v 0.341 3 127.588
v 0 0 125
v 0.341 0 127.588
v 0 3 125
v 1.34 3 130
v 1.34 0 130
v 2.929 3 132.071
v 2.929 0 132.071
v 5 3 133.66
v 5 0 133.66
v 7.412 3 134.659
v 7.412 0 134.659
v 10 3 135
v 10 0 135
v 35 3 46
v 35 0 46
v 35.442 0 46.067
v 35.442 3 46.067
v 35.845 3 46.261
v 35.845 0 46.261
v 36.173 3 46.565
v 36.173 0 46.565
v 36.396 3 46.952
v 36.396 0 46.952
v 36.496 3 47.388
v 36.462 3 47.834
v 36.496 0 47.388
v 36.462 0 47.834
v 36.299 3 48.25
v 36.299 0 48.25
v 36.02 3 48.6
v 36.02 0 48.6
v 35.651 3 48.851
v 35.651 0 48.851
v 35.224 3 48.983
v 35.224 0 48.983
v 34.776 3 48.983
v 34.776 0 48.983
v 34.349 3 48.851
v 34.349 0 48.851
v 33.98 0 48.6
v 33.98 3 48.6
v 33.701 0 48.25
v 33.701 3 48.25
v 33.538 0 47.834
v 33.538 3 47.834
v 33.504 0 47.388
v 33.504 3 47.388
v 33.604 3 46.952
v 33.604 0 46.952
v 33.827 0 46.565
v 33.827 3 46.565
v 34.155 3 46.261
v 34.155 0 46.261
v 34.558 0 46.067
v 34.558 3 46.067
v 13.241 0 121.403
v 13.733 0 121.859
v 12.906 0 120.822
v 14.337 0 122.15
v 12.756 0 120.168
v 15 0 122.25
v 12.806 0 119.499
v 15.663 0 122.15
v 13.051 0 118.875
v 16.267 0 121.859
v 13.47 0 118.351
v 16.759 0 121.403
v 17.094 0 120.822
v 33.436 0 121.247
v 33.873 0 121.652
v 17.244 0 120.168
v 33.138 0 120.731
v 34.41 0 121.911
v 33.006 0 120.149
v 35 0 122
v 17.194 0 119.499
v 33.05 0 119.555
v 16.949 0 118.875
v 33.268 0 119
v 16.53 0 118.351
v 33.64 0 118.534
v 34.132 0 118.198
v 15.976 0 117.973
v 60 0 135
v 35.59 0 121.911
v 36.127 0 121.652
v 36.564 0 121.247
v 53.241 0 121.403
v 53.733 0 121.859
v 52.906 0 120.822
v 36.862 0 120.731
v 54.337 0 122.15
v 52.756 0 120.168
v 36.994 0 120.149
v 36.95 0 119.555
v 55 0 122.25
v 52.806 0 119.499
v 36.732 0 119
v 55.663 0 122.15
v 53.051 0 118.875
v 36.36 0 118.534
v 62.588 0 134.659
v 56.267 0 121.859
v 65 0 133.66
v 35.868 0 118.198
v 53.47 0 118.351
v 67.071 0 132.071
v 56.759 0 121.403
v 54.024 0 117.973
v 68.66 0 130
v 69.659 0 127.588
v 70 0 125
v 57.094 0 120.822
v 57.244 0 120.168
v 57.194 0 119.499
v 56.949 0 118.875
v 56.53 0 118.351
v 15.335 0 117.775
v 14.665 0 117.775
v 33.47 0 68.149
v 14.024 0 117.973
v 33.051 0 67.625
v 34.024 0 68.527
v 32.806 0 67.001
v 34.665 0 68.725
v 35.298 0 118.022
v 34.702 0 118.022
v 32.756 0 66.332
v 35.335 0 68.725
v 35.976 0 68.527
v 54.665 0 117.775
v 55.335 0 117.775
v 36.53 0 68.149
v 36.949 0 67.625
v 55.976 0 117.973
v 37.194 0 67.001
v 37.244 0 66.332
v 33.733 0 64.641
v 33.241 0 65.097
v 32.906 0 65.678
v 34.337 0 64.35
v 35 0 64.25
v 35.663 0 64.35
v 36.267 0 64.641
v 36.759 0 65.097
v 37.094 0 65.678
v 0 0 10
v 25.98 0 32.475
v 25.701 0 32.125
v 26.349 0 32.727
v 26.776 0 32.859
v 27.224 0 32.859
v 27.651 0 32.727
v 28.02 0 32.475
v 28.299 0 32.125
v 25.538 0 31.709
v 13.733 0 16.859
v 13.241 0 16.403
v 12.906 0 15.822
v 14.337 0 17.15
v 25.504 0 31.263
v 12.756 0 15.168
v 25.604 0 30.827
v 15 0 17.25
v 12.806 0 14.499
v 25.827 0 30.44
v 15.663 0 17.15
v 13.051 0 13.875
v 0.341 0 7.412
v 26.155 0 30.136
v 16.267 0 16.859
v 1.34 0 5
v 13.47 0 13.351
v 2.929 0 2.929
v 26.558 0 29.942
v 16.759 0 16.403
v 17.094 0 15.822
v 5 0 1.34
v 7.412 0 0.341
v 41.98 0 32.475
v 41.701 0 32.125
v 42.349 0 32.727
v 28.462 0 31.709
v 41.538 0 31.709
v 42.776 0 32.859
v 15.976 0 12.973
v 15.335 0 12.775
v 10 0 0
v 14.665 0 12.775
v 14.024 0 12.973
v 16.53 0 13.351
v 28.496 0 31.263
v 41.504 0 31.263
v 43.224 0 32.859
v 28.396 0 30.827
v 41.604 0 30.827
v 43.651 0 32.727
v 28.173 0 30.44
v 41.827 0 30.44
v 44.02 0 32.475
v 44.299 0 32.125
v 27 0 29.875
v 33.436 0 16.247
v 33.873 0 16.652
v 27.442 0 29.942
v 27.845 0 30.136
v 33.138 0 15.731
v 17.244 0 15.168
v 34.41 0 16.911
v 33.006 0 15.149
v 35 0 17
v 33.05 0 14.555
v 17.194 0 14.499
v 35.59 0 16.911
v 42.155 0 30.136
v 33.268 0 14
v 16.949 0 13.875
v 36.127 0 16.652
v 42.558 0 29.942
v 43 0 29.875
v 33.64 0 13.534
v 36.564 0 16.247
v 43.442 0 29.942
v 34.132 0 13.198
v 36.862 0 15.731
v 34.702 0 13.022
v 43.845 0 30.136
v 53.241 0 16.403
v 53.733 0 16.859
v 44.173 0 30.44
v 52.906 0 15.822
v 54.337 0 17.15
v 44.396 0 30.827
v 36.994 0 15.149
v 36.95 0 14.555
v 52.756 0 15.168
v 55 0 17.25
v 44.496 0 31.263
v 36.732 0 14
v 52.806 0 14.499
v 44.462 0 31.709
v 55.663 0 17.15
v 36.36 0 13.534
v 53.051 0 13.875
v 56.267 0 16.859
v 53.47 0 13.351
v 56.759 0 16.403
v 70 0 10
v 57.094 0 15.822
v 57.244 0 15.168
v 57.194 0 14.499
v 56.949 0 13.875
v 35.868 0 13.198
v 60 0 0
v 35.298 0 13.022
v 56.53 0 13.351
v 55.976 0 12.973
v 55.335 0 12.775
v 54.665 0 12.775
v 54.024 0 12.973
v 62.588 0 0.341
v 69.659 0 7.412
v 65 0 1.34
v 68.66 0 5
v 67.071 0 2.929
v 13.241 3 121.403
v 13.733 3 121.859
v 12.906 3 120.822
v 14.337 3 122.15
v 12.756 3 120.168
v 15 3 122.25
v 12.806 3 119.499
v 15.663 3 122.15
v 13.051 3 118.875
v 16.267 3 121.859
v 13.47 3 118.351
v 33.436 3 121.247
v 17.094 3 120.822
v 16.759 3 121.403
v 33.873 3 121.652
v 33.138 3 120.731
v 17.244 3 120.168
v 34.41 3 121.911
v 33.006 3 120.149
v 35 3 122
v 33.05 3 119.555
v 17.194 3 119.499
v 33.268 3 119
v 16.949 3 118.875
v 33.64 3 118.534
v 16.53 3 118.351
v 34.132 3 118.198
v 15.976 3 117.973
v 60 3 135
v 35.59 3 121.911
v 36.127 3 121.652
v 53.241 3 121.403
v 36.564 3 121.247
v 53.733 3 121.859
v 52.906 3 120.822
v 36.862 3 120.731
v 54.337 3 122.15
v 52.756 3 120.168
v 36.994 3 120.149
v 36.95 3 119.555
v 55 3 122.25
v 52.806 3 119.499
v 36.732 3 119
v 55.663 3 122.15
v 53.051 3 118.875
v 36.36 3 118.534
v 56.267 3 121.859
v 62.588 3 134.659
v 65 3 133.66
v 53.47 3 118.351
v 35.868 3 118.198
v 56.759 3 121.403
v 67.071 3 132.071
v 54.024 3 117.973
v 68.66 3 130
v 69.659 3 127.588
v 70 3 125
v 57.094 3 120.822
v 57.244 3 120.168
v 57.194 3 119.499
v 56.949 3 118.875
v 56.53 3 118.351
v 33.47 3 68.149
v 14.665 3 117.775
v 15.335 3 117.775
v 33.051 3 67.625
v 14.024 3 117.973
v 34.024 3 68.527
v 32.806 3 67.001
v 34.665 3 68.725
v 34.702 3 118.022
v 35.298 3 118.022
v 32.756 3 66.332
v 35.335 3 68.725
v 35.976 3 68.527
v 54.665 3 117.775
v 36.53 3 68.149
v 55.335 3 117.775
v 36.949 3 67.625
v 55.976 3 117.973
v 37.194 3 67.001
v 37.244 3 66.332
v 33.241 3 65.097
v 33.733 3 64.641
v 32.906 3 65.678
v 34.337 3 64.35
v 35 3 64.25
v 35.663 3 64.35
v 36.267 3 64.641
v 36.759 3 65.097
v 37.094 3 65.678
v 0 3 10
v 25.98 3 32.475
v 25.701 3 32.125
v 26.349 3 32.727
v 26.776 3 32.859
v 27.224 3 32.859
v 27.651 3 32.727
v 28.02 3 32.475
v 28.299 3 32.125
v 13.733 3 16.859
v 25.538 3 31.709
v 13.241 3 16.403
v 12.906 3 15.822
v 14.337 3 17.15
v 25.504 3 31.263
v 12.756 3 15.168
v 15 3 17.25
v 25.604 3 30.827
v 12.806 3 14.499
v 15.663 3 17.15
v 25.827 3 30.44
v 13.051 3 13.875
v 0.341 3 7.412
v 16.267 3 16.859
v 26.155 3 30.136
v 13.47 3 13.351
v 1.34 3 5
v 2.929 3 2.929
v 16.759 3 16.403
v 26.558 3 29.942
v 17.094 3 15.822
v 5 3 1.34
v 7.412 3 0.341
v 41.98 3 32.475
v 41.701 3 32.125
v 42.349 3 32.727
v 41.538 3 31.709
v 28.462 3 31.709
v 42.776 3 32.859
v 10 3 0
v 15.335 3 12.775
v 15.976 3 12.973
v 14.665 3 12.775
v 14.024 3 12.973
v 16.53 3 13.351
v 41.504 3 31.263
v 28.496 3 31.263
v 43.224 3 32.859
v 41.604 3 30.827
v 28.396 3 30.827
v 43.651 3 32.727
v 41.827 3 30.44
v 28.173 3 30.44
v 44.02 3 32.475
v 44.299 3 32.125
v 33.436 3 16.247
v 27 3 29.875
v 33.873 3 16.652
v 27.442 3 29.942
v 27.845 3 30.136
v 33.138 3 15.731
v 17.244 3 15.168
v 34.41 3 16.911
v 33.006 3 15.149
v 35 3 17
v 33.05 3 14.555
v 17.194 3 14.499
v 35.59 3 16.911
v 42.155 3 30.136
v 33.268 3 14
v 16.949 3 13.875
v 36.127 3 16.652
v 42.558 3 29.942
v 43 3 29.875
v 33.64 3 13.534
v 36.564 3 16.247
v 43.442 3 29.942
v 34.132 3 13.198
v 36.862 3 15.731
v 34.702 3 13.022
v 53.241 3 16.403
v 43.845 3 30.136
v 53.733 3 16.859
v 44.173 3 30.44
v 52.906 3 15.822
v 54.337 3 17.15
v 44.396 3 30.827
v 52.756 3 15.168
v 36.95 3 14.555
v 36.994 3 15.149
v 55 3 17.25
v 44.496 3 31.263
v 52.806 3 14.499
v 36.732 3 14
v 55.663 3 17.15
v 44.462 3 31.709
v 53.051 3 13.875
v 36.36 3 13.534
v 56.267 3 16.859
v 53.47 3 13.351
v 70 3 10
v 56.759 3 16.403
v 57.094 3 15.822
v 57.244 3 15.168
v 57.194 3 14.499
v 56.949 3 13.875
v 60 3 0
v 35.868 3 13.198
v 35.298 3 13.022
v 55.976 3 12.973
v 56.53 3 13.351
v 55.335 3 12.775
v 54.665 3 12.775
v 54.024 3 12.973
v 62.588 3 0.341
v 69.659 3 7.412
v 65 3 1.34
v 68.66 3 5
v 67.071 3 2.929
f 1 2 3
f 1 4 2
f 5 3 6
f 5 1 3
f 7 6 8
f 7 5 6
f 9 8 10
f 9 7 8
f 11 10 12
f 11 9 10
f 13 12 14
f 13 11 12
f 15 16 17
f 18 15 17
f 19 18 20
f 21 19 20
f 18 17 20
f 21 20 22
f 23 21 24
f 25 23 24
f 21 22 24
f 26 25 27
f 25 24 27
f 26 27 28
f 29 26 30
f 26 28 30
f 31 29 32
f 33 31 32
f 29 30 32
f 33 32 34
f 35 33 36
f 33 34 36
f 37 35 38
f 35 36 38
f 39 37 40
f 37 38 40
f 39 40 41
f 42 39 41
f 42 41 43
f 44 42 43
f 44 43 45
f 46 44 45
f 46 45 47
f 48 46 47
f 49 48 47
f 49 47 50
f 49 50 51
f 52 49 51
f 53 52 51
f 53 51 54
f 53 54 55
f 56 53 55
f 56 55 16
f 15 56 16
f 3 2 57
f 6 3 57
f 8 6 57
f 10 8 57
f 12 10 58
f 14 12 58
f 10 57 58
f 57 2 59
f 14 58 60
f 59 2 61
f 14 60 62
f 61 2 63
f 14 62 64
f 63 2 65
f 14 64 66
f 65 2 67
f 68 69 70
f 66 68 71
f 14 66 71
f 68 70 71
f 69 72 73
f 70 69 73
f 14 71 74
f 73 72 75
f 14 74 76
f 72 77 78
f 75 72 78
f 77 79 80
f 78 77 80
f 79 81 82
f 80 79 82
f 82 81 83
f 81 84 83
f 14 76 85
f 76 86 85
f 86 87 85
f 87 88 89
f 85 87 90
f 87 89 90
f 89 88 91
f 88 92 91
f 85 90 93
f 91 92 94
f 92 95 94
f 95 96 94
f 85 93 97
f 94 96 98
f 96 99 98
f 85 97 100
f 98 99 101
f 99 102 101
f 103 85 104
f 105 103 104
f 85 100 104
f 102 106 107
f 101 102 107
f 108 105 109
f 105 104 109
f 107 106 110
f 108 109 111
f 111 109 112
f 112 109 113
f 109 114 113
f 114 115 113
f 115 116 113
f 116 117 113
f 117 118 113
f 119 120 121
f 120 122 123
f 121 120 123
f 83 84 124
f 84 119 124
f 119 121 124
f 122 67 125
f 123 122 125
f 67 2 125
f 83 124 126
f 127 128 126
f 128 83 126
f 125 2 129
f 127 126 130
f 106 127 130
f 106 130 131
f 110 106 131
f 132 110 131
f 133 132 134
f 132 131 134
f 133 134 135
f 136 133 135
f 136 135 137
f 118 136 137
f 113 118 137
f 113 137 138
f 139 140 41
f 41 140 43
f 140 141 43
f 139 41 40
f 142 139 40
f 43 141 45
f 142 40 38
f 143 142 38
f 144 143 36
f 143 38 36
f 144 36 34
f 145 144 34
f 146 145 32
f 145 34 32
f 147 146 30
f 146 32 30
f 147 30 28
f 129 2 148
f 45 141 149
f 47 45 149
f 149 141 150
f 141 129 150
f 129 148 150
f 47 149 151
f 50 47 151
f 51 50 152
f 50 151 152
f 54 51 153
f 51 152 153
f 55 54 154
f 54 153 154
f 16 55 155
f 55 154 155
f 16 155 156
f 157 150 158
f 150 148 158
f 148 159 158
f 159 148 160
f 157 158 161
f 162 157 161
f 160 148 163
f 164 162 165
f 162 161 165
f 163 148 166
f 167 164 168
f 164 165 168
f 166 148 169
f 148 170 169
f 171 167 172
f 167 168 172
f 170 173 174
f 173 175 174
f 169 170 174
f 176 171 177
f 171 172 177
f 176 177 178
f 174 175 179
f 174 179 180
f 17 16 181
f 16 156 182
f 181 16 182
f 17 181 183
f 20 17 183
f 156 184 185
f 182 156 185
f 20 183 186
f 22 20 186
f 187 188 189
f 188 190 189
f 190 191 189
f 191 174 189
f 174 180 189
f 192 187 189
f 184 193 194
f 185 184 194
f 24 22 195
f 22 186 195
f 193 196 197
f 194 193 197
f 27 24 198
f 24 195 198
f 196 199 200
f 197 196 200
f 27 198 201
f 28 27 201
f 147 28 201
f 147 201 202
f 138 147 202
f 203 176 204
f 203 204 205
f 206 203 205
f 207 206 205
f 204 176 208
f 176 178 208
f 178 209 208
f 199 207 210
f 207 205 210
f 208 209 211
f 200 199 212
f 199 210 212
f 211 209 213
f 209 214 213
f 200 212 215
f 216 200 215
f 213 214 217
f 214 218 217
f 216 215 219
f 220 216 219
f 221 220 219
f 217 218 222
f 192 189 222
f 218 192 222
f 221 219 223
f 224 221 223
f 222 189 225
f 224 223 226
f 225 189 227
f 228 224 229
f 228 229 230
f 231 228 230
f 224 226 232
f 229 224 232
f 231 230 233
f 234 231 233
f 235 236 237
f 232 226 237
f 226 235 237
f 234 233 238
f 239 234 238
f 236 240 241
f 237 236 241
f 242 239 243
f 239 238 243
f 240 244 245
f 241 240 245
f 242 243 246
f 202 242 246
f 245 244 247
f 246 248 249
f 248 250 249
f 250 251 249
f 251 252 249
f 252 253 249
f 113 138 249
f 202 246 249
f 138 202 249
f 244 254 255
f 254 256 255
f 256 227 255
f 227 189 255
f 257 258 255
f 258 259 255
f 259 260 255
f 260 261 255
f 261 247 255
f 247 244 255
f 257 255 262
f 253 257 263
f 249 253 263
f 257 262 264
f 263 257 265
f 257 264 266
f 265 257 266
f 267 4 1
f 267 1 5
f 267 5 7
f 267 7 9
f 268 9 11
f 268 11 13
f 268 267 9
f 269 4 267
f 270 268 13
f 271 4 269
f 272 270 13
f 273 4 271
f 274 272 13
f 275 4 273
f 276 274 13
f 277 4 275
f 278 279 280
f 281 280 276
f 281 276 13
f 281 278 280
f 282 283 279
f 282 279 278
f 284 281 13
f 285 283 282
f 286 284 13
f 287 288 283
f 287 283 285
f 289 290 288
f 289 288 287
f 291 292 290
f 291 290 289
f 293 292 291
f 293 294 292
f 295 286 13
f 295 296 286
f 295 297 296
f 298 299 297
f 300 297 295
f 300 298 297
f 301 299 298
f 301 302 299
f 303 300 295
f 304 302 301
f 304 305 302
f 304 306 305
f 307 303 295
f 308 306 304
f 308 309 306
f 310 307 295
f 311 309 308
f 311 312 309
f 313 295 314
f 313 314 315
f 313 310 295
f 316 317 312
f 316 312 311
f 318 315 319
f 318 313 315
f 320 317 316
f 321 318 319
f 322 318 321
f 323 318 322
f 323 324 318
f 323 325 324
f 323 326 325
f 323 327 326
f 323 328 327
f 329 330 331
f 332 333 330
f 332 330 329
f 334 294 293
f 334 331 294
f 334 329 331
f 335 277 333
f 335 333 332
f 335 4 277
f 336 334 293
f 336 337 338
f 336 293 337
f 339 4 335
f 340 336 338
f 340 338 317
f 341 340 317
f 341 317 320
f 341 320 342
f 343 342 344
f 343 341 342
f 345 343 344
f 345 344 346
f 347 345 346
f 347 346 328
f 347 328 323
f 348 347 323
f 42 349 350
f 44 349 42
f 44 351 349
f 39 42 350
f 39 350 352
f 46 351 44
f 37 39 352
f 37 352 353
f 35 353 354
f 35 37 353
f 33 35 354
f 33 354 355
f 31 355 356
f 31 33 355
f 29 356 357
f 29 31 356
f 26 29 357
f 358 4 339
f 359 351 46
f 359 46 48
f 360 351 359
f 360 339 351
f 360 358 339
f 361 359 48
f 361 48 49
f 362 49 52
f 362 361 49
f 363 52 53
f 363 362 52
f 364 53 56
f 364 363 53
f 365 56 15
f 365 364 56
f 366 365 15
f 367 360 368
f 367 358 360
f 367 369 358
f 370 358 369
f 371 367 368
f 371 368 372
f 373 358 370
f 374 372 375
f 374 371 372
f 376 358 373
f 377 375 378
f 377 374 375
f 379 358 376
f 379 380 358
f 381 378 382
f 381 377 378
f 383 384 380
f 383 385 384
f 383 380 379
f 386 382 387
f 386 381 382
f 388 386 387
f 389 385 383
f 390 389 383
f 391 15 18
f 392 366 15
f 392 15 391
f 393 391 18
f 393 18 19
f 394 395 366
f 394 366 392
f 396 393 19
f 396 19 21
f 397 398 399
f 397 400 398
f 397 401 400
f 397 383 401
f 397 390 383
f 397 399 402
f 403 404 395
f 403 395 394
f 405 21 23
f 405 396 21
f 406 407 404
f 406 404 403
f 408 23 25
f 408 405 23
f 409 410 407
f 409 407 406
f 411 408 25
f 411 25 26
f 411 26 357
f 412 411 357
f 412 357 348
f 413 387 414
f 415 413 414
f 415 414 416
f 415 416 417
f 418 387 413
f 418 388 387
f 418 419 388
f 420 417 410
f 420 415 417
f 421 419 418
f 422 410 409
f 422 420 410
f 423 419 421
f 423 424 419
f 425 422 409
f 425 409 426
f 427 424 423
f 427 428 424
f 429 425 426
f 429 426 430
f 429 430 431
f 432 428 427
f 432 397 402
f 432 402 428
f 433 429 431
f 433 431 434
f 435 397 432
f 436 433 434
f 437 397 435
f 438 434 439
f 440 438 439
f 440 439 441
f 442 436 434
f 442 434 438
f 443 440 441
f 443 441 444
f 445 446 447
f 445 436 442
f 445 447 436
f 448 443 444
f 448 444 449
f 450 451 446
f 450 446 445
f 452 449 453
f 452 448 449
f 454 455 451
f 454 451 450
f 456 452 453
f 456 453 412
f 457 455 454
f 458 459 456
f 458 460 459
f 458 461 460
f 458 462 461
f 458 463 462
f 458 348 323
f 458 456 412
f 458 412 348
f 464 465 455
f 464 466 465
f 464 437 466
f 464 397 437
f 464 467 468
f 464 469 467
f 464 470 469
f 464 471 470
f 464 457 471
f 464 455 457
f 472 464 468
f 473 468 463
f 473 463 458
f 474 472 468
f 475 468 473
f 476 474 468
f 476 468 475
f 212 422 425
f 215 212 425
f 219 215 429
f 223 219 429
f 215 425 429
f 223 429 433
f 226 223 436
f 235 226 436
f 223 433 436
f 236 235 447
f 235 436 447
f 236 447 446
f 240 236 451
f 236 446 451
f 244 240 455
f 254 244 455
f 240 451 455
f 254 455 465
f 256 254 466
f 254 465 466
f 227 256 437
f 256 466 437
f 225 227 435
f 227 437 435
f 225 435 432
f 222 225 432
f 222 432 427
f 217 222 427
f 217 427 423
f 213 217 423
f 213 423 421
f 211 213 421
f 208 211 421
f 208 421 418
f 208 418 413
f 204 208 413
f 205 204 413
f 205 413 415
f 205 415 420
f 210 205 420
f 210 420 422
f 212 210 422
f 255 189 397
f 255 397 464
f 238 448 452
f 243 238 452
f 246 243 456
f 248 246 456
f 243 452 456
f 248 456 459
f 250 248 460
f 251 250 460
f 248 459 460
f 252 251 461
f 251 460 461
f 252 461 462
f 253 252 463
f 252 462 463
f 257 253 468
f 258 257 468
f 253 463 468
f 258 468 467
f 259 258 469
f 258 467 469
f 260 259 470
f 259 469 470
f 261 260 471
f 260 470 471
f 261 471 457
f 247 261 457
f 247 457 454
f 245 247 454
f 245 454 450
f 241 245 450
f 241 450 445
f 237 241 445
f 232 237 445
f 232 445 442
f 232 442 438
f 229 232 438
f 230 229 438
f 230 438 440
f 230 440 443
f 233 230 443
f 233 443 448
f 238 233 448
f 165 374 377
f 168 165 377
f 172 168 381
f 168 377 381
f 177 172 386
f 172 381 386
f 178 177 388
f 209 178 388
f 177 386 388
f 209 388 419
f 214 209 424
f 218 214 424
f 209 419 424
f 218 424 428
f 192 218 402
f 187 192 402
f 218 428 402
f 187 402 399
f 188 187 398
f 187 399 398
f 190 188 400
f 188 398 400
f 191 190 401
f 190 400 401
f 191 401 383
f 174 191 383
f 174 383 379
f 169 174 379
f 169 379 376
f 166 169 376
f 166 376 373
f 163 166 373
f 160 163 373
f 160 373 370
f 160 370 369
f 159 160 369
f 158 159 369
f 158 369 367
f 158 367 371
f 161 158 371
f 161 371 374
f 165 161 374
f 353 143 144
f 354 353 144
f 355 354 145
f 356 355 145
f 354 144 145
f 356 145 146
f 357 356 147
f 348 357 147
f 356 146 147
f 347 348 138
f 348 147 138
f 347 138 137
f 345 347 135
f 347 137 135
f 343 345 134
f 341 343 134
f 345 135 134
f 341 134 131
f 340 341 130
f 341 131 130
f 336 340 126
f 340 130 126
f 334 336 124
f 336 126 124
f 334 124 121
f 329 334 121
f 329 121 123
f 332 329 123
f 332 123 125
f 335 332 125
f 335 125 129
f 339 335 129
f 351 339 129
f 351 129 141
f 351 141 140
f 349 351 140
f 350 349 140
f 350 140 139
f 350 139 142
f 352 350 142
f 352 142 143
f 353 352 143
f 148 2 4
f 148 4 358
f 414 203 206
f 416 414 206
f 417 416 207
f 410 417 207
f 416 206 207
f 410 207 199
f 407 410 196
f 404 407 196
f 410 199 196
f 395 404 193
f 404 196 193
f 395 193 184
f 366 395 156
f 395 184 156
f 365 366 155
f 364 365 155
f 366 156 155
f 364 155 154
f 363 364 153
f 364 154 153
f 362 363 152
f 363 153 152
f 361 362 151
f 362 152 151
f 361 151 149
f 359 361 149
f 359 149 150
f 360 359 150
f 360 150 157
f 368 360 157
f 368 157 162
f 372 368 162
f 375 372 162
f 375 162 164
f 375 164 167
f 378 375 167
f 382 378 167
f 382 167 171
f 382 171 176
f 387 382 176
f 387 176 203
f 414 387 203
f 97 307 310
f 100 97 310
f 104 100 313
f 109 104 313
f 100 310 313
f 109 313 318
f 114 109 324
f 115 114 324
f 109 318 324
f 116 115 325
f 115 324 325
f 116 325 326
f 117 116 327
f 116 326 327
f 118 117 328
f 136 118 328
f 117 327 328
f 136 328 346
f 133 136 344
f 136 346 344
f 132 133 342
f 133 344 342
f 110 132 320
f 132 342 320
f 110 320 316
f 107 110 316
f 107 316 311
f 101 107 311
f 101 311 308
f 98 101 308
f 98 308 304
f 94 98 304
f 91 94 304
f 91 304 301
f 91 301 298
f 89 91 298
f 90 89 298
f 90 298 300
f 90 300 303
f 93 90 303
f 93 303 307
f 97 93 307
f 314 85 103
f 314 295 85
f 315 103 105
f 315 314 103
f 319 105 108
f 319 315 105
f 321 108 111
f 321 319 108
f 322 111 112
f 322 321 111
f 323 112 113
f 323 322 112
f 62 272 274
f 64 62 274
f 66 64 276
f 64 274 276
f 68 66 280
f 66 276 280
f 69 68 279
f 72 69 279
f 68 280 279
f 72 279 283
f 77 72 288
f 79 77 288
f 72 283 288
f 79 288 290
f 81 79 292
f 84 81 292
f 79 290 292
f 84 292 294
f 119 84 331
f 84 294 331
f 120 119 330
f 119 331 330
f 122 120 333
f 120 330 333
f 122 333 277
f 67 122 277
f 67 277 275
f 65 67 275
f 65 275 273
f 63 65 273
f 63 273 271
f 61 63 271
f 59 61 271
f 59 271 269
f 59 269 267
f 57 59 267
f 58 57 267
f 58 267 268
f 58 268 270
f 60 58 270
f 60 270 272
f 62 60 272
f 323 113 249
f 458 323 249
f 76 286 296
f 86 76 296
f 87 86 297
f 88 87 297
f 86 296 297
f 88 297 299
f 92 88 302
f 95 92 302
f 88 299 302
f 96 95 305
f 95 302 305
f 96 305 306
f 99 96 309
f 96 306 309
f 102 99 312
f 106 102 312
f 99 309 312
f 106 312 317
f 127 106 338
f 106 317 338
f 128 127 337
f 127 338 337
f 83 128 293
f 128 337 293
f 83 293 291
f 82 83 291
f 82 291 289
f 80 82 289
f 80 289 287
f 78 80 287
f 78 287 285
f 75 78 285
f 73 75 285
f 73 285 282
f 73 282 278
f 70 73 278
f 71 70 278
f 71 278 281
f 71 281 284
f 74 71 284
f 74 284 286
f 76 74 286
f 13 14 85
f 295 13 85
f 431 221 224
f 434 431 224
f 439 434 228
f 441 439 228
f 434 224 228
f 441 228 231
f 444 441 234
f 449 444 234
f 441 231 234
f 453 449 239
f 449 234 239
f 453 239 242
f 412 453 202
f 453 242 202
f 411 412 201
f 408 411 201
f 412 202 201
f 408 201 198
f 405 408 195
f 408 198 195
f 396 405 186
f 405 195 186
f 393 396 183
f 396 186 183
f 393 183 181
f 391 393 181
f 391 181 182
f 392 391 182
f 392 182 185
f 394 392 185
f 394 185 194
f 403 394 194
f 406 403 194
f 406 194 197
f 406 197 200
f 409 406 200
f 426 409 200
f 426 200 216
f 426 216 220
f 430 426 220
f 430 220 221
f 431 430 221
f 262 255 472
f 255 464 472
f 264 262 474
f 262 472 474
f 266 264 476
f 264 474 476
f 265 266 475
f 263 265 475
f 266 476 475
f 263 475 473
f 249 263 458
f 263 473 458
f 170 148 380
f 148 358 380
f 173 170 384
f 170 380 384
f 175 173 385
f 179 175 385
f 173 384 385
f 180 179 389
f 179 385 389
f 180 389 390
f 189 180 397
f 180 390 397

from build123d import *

# Parameters (mm, degrees)
SKETCH_1_W          = 70
SKETCH_1_H          = 135
EXTRUDE_1_DEPTH     = 3
SKETCH_2_R          = 2.25
SKETCH_2_R_2        = 2
CUT_EXTRUDE_1_DEPTH = 153.098652197
FILLET_1_R          = 10
SKETCH_3_R          = 1.5
SKETCH_3_R_2        = 2.25
CUT_EXTRUDE_2_DEPTH = 153.098652197


with BuildPart() as part:
    # 草图1 → 凸台-拉伸1 (new body)
    with BuildSketch(Plane(origin=(0, 0, 0), x_dir=(1, 0, 0), z_dir=(0, 1, 0))):
        with Locations((35, -67.5)):
            Rectangle(SKETCH_1_W, SKETCH_1_H)
    extrude(amount=EXTRUDE_1_DEPTH)

    # 草图2 → 切除-拉伸1 (cut, through all)
    with BuildSketch(Plane(origin=(0, 3, 0), x_dir=(1, 0, 0), z_dir=(0, 1, 0))):
        with Locations(Location((15, -15, 0), (0, 0, 270))):
            Circle(SKETCH_2_R)
        with Locations(Location((55, -15, 0), (0, 0, 270))):
            Circle(SKETCH_2_R)
        with Locations(Location((15, -120, 0), (0, 0, 270))):
            Circle(SKETCH_2_R)
        with Locations(Location((55, -120, 0), (0, 0, 270))):
            Circle(SKETCH_2_R)
        with Locations(Location((35, -120, 0), (0, 0, 270))):
            Circle(SKETCH_2_R_2)
        with Locations(Location((35, -15, 0), (0, 0, 270))):
            Circle(SKETCH_2_R_2)
    extrude(amount=-CUT_EXTRUDE_1_DEPTH, mode=Mode.SUBTRACT)

    # 圆角1
    fillet_1_edges = [part.edges().sort_by_distance(p)[0] for p in [
        (0, 1.5, 0),
        (70, 1.5, 0),
        (70, 1.5, 135),
        (0, 1.5, 135),
    ]]
    fillet(fillet_1_edges, radius=FILLET_1_R)

    # 草图3 → 切除-拉伸2 (cut, through all)
    with BuildSketch(Plane.XZ):
        with Locations(Location((35, 47.5, 0), (0, 0, 270))):
            Circle(SKETCH_3_R)
        with Locations(Location((43, 31.375484503, 0), (0, 0, 270))):
            Circle(SKETCH_3_R)
        with Locations(Location((27, 31.375484503, 0), (0, 0, 270))):
            Circle(SKETCH_3_R)
        with Locations(Location((35, 66.5, 0), (0, 0, 270))):
            Circle(SKETCH_3_R_2)
    extrude(amount=-CUT_EXTRUDE_2_DEPTH, mode=Mode.SUBTRACT)


solid = part.part
